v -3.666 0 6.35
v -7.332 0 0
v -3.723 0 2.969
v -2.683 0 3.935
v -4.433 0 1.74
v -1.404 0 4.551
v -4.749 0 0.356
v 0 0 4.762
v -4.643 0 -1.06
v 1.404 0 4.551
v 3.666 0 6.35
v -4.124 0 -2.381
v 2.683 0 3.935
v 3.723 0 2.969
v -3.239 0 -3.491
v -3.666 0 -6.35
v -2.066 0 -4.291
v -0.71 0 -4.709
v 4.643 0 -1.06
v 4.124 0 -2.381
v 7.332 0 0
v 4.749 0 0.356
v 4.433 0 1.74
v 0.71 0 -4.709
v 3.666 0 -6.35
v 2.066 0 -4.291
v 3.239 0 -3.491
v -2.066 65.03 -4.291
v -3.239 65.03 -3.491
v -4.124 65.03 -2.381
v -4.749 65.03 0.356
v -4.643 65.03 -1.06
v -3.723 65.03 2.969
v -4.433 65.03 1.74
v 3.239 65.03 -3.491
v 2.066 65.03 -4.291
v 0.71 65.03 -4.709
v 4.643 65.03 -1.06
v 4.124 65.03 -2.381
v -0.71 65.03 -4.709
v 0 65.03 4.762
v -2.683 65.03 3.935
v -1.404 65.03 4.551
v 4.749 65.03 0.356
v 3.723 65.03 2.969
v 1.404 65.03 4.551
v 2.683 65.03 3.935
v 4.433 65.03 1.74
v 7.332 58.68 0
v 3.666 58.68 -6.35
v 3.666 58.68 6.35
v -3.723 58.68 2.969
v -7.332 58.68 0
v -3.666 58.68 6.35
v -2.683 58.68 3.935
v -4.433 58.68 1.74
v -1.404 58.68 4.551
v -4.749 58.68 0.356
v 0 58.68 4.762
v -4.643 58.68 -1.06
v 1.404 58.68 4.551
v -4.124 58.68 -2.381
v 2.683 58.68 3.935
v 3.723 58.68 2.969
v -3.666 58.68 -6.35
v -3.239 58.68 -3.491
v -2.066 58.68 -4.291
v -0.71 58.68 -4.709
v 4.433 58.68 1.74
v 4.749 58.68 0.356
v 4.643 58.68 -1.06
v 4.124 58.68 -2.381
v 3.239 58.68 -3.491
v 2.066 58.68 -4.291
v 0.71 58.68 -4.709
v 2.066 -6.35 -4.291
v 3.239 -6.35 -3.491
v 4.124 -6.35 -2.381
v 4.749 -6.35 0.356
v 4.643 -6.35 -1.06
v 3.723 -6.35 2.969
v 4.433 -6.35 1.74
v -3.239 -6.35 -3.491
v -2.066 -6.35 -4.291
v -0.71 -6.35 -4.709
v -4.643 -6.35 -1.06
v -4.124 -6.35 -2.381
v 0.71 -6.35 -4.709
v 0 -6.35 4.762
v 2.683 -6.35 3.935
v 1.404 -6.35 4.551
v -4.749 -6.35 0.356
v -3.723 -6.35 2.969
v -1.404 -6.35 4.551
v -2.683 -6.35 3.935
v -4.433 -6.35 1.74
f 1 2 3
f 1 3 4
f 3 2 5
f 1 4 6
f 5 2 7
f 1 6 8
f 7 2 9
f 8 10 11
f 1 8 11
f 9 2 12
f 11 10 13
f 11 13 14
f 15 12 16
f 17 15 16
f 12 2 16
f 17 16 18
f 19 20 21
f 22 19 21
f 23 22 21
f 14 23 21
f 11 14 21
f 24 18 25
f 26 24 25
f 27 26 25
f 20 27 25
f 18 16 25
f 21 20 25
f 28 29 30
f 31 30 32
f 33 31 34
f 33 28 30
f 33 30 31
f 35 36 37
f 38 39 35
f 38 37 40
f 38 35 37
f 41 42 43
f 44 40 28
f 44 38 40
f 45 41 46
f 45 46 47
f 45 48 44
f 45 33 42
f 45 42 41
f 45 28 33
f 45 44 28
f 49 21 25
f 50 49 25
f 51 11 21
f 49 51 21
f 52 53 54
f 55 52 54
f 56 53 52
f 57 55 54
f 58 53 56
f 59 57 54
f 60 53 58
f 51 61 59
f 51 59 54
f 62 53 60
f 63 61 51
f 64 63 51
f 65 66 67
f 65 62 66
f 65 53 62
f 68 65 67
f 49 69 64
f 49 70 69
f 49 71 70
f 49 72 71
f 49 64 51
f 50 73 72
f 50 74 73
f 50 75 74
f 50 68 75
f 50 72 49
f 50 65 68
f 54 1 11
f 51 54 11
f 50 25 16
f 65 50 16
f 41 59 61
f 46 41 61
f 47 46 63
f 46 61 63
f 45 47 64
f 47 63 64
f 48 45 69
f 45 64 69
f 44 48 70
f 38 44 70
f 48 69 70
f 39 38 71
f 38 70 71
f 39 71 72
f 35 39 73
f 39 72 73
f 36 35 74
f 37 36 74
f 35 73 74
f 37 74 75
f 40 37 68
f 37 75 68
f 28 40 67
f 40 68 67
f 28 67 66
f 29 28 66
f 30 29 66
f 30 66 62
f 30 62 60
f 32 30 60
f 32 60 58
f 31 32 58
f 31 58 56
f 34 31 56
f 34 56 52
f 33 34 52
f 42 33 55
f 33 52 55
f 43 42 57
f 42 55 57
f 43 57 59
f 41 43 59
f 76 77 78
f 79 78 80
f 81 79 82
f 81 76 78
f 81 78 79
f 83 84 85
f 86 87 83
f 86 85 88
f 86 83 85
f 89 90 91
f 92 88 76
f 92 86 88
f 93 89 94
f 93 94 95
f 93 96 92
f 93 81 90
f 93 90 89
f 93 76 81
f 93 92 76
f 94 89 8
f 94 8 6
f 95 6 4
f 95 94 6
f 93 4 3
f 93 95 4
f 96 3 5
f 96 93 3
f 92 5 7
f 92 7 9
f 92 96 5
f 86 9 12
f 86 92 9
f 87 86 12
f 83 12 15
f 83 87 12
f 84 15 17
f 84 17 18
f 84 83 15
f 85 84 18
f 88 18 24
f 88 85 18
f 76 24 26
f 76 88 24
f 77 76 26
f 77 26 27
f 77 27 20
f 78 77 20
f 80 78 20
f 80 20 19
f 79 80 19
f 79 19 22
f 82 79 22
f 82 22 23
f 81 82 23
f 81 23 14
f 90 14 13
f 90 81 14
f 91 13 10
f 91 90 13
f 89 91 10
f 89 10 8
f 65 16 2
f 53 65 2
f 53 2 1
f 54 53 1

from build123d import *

# Parameters (mm, degrees)
SALIENTE_EXTRUIR1_DEPTH = 58.68
CROQUIS2_R              = 4.7625
SALIENTE_EXTRUIR2_DEPTH = 6.35
SALIENTE_EXTRUIR3_START = 6.35
CROQUIS3_R              = 4.7625
SALIENTE_EXTRUIR3_DEPTH = 6.35


with BuildPart() as part:
    # Croquis1 → Saliente-Extruir1 (new body)
    with BuildSketch(Plane(origin=(0, 0, 0), x_dir=(1, 0, 0), z_dir=(0, 1, 0))):
        Polygon((7.332348419, 0), (3.666174209, 6.35), (-3.666174209, 6.35), (-7.332348419, 0), (-3.666174209, -6.35), (3.666174209, -6.35), align=None)
    extrude(amount=SALIENTE_EXTRUIR1_DEPTH)

    # Croquis2 → Saliente-Extruir2 (add)
    with BuildSketch(Plane(origin=(0, 58.68, 0), x_dir=(1, 0, 0), z_dir=(0, 1, 0))):
        with Locations(Location((0, 0, 0), (0, 0, 270))):
            Circle(CROQUIS2_R)
    extrude(amount=SALIENTE_EXTRUIR2_DEPTH)

    # Croquis3 → Saliente-Extruir3 (add)
    with BuildSketch(Plane.XZ.offset(SALIENTE_EXTRUIR3_START)):
        with Locations(Location((0, 0, 0), (0, 0, 90))):
            Circle(CROQUIS3_R)
    extrude(amount=-SALIENTE_EXTRUIR3_DEPTH)


solid = part.part
